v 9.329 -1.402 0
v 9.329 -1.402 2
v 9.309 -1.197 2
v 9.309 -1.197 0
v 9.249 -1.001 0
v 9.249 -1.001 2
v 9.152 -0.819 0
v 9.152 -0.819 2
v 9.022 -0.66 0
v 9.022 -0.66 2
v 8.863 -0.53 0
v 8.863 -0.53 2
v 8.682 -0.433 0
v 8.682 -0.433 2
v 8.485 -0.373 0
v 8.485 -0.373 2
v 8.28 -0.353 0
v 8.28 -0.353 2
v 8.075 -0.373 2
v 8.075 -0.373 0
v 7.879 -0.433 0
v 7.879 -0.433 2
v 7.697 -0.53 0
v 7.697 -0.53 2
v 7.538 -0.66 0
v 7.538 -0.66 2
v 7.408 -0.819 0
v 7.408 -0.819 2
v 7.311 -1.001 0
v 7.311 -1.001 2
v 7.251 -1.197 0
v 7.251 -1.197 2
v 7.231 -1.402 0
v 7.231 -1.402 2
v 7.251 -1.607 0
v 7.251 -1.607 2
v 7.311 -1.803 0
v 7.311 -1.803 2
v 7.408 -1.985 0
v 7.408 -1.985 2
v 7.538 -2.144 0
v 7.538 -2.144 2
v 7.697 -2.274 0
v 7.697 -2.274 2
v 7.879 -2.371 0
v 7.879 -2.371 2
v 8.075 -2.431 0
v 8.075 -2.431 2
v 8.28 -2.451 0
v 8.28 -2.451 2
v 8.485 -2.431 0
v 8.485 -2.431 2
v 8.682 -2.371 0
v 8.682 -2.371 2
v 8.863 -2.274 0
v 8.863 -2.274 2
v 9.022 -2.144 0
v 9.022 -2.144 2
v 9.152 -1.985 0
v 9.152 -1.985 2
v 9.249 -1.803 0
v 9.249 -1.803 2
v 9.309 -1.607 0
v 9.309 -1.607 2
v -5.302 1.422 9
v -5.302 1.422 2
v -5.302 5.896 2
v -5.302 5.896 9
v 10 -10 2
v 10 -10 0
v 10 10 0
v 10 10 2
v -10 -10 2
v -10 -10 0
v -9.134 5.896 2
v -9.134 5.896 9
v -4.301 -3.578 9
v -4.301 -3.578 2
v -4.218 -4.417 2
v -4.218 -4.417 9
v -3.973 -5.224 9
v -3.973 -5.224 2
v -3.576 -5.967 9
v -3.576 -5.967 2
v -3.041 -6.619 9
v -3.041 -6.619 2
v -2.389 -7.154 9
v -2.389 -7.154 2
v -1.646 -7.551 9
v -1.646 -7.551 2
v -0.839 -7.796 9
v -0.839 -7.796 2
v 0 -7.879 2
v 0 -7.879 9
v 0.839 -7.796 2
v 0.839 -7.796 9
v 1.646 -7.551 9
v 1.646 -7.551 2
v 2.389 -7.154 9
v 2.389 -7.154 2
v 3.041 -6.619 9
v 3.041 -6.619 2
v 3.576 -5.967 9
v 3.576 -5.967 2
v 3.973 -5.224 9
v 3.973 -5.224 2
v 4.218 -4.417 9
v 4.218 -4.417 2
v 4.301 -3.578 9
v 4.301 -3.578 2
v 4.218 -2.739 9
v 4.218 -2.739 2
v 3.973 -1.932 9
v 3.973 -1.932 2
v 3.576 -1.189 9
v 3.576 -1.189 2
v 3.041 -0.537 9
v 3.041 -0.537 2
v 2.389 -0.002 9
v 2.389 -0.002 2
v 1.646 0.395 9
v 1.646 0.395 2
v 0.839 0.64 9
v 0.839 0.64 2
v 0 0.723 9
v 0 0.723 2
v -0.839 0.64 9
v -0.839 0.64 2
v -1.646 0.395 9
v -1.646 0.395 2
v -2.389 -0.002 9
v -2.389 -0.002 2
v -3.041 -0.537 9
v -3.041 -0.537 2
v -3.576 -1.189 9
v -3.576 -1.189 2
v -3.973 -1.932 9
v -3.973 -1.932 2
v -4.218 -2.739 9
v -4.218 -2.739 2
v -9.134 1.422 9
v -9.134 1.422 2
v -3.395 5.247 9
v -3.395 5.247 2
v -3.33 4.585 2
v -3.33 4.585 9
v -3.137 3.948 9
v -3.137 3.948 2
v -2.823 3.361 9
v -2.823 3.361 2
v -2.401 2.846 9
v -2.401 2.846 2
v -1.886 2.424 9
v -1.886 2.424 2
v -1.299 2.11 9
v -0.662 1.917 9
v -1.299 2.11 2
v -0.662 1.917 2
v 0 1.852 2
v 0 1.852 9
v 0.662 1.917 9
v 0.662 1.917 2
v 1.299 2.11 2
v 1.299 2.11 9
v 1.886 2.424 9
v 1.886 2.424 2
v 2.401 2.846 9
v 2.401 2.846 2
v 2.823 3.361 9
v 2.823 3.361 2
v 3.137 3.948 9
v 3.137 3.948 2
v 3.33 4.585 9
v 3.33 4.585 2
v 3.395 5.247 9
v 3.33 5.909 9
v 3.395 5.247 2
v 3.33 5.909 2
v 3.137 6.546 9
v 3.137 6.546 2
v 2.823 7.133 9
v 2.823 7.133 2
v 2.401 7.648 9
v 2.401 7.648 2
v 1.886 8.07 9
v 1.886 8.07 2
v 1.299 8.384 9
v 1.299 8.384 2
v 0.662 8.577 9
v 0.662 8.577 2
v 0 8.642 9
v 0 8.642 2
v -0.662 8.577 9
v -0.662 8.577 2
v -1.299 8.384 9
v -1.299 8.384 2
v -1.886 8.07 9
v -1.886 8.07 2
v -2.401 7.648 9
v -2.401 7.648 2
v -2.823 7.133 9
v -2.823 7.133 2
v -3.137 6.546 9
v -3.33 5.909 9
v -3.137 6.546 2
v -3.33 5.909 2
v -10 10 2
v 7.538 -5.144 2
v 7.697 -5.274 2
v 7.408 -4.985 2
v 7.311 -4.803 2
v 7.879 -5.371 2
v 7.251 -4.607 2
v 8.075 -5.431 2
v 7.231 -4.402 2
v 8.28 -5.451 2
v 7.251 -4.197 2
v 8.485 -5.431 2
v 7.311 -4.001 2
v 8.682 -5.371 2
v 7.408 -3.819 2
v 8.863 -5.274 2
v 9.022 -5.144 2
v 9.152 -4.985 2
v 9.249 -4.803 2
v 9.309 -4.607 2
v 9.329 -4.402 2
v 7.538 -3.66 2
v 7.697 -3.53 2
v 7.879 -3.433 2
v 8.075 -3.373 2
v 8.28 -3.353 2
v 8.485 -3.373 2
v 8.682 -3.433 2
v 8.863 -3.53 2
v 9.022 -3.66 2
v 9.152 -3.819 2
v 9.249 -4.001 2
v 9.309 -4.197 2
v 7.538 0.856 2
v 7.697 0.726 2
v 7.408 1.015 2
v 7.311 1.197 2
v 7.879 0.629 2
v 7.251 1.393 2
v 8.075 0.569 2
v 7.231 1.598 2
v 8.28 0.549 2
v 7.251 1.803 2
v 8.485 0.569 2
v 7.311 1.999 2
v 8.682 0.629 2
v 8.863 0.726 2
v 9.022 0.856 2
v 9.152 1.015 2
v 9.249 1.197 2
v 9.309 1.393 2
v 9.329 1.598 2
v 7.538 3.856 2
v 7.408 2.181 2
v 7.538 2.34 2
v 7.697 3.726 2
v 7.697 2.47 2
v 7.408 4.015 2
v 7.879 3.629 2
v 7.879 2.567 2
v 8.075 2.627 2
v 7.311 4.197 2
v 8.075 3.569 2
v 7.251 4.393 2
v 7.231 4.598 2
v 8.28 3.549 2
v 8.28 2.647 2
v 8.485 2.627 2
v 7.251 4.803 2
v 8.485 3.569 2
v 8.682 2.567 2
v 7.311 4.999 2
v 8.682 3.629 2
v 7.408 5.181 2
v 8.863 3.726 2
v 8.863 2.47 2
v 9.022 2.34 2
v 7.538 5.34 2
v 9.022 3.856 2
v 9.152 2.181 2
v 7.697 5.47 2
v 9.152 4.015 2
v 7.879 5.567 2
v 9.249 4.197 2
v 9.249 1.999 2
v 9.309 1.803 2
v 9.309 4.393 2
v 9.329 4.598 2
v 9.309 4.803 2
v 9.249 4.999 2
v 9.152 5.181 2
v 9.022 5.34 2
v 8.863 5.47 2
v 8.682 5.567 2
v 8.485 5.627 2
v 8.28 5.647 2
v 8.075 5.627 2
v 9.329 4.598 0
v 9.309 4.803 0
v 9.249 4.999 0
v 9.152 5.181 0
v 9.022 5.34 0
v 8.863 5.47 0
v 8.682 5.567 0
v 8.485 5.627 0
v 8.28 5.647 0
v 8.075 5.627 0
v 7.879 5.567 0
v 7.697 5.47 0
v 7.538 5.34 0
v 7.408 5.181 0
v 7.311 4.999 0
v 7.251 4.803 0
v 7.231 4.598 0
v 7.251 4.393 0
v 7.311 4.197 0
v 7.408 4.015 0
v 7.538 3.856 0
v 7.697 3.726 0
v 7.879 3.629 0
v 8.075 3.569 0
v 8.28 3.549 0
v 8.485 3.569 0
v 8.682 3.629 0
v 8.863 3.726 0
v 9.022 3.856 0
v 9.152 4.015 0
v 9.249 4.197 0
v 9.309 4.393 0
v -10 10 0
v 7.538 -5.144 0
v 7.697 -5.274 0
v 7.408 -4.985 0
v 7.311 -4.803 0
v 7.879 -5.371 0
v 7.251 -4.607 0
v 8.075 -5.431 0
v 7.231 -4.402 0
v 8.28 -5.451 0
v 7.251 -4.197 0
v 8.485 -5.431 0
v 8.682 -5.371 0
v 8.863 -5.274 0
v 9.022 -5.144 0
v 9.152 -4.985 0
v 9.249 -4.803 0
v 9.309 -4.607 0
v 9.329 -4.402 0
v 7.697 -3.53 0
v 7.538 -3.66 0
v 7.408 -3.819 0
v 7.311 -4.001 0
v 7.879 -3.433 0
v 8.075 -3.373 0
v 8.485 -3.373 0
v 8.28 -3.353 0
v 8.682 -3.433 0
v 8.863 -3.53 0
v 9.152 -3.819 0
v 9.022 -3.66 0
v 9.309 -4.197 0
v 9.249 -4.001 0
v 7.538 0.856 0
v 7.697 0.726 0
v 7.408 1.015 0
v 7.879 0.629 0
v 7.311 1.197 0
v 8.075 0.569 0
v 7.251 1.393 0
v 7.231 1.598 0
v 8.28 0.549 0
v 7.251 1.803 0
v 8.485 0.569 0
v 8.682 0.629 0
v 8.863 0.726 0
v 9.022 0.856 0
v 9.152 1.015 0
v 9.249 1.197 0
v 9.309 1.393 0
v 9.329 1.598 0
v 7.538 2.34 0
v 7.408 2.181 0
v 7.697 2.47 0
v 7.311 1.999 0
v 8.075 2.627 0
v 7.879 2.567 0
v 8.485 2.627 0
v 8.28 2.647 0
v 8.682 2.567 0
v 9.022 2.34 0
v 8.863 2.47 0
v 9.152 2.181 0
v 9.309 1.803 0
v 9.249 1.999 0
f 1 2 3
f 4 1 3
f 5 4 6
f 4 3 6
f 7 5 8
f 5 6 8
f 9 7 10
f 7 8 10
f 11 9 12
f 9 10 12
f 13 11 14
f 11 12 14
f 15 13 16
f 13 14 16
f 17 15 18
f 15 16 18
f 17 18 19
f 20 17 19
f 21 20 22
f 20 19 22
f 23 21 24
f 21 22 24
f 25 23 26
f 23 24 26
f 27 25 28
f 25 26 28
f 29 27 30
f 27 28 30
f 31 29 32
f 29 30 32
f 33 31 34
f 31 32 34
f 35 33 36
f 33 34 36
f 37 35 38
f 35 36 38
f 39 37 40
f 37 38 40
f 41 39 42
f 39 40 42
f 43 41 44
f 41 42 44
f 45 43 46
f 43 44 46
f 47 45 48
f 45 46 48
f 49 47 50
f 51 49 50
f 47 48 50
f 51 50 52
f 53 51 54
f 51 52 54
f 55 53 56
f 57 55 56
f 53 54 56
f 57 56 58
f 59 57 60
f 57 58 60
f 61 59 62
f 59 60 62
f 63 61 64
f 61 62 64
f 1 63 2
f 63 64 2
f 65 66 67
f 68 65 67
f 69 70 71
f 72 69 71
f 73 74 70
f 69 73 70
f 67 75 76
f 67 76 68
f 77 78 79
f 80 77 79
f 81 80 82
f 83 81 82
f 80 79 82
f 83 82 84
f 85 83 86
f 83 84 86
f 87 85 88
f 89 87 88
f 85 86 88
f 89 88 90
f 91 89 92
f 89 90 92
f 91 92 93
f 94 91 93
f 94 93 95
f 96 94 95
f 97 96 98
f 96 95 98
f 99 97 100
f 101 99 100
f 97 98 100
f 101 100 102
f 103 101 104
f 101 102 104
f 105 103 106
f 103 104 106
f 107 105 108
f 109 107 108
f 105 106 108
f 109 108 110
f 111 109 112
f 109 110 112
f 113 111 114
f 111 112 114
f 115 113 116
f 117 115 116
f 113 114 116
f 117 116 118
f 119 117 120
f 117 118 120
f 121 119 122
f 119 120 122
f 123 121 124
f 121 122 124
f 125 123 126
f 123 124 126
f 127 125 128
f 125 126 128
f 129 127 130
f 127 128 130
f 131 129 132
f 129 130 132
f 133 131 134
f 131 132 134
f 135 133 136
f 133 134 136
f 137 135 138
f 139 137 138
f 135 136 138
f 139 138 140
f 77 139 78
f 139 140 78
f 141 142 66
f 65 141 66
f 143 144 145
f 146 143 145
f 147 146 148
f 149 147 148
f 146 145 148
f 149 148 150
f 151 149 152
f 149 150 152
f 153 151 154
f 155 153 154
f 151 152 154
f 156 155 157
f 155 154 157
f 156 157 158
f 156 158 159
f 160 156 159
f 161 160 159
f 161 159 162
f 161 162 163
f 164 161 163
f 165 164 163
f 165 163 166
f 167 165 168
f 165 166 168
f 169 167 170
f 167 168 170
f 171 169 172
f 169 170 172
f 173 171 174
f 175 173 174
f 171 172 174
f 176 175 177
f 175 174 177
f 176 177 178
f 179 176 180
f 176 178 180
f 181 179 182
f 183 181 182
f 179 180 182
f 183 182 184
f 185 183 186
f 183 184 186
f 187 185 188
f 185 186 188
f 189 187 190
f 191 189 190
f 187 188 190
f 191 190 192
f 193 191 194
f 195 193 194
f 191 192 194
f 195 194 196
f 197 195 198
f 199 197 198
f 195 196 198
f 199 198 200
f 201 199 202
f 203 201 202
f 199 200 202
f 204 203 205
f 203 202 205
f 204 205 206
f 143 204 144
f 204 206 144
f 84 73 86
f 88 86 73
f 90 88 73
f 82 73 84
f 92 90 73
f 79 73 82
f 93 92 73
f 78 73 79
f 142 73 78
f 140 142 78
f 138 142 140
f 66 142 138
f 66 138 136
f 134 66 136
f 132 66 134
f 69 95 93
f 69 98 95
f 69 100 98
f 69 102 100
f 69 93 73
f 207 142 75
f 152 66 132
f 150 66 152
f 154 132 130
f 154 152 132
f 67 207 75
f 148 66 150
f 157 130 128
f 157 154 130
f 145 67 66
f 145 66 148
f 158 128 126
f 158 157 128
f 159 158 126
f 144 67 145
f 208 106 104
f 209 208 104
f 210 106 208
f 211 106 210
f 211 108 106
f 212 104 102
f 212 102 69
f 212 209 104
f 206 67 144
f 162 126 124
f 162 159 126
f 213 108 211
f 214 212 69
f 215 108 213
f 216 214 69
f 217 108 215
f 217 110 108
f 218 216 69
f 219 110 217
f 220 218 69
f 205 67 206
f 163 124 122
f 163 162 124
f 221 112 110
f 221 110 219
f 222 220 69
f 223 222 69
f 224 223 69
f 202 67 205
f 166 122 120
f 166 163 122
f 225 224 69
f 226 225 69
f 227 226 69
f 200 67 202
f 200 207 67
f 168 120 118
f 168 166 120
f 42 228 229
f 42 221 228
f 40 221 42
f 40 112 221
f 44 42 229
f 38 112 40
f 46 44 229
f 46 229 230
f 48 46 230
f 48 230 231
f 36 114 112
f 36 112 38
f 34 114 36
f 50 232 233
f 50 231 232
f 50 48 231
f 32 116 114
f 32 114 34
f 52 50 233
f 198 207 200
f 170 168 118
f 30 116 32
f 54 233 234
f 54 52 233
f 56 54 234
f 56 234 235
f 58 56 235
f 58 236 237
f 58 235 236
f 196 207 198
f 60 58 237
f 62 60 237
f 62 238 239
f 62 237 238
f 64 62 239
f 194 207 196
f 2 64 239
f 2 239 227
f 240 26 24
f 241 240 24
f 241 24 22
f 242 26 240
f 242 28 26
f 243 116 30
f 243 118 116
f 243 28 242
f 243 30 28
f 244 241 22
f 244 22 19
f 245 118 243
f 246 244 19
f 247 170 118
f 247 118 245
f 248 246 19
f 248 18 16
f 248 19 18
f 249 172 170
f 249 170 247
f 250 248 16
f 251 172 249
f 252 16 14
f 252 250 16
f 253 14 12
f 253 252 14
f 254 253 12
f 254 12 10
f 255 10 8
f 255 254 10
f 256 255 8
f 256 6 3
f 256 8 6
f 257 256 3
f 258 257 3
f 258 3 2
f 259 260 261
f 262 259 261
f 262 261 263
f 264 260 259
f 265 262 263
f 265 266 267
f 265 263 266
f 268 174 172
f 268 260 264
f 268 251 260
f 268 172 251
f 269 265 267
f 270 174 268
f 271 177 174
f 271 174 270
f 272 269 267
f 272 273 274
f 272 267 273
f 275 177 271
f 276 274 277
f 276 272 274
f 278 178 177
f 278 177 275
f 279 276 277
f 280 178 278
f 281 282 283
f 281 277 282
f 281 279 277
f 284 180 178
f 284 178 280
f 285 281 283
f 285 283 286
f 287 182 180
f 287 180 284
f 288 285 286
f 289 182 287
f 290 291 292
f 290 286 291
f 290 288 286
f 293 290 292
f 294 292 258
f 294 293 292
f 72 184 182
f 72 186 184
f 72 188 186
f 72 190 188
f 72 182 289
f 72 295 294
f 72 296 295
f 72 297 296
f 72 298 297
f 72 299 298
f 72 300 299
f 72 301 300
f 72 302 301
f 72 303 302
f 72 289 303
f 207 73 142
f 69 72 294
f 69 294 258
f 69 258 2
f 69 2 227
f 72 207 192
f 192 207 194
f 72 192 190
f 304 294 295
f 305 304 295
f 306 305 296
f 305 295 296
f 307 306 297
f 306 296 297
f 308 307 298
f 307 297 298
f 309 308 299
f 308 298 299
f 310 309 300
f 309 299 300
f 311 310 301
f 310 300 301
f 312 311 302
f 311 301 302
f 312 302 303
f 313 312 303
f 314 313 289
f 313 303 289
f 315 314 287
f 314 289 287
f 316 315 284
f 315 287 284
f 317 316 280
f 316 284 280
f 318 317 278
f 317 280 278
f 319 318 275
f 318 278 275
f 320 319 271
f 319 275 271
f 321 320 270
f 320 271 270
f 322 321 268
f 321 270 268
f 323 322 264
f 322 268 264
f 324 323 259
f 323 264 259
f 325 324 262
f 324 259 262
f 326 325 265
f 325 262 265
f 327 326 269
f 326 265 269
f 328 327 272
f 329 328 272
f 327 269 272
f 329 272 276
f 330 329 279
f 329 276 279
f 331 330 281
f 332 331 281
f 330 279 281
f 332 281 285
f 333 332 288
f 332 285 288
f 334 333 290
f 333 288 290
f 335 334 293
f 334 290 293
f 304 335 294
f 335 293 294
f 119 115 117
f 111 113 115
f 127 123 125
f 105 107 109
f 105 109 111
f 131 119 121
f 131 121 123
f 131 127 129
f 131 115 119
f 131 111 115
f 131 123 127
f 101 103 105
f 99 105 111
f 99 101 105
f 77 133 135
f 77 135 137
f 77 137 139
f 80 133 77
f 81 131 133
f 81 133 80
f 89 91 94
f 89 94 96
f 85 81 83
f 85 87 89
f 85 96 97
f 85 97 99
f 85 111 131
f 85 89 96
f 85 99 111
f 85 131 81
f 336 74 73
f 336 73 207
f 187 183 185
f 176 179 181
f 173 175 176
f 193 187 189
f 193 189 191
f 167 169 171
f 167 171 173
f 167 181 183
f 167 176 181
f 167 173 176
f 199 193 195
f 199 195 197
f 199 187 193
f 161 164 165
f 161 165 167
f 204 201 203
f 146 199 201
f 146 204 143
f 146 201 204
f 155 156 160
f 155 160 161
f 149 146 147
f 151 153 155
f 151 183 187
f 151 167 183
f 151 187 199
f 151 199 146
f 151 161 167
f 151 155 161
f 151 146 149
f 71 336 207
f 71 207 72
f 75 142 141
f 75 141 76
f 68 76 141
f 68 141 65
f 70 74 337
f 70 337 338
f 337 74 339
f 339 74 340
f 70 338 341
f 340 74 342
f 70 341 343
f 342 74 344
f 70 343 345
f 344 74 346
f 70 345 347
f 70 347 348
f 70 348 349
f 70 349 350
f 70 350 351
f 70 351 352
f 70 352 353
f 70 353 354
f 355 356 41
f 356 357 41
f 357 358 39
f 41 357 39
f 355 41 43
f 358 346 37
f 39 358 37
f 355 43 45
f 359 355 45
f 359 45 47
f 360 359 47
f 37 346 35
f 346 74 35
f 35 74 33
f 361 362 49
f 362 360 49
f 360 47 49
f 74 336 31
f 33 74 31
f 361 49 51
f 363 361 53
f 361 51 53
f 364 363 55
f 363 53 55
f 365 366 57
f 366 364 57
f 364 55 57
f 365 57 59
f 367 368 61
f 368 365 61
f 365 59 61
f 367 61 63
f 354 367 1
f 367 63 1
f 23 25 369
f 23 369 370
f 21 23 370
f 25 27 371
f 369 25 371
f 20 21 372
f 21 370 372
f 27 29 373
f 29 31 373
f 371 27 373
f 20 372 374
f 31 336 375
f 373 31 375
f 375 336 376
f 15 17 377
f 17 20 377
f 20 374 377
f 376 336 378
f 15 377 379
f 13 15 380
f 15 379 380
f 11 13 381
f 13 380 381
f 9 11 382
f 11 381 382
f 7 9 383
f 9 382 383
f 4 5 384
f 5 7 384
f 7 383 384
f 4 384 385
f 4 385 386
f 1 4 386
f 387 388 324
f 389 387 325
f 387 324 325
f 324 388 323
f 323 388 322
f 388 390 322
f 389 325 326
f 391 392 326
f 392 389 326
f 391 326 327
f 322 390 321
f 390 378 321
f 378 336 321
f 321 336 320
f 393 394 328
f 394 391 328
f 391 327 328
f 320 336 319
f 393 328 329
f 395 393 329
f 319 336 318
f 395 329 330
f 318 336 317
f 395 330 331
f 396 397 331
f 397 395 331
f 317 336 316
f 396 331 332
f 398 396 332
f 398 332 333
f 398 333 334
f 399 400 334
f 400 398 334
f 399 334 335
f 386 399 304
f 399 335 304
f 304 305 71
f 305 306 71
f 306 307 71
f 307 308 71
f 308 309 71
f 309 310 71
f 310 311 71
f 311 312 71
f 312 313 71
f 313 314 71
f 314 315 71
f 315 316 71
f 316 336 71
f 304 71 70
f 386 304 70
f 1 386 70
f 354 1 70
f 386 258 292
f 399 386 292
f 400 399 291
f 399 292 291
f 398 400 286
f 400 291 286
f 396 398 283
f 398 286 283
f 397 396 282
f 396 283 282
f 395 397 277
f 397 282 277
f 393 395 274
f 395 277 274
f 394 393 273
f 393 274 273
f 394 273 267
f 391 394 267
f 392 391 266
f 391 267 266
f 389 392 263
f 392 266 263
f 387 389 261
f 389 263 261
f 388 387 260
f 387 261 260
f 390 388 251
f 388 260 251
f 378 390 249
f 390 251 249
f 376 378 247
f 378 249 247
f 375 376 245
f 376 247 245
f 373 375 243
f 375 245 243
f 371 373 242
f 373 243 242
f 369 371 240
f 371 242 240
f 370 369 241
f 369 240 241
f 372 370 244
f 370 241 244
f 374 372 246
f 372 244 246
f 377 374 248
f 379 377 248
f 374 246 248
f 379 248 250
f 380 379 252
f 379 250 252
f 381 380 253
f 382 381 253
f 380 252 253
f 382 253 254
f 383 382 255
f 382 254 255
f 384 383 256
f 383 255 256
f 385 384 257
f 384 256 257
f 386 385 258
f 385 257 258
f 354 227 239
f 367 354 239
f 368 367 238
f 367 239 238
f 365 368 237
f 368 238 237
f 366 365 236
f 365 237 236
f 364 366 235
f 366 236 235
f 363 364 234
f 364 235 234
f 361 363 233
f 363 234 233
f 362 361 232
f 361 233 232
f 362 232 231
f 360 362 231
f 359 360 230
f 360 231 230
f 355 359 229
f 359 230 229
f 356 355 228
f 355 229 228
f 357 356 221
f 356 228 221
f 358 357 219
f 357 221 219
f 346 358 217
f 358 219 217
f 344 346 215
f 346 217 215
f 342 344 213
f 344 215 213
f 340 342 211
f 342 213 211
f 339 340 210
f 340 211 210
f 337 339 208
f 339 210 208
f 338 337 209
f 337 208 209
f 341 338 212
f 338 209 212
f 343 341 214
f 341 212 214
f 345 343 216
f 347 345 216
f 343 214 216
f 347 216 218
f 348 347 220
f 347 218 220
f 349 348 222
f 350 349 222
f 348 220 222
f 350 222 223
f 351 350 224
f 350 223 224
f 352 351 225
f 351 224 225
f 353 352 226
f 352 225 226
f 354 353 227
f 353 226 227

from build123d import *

# Parameters (mm, degrees)
CROQUIS1_W              = 20
CROQUIS1_H              = 20
SALIENTE_EXTRUIR1_DEPTH = 2
CROQUIS2_R              = 3.395302969
CROQUIS2_R_2            = 4.300626918
CROQUIS2_W              = 3.832057349
CROQUIS2_H              = 4.474113334
SALIENTE_EXTRUIR2_DEPTH = 7
CROQUIS3_R              = 1.048920166
CORTAR_EXTRUIR1_DEPTH   = 2


with BuildPart() as part:
    # Croquis1 → Saliente-Extruir1 (new body)
    with BuildSketch(Plane.XY):
        Rectangle(CROQUIS1_W, CROQUIS1_H)
    extrude(amount=SALIENTE_EXTRUIR1_DEPTH)

    # Croquis2 → Saliente-Extruir2 (add)
    with BuildSketch(Plane.XY.offset(2)):
        with Locations(Location((0, 5.24700562, 0), (0, 0, 180))):
            Circle(CROQUIS2_R)
        with Locations(Location((0, -3.577988987, 0), (0, 0, 180))):
            Circle(CROQUIS2_R_2)
        with Locations((-7.217868445, 3.658804494)):
            Rectangle(CROQUIS2_W, CROQUIS2_H)
    extrude(amount=SALIENTE_EXTRUIR2_DEPTH)

    # Croquis3 → Cortar-Extruir1 (cut)
    with BuildSketch(Plane.XY.offset(2)):
        with Locations((8.280127459, 4.598002093)):
            Circle(CROQUIS3_R)
        with Locations((8.280127459, 1.598002093)):
            Circle(CROQUIS3_R)
        with Locations((8.280127459, -1.401997907)):
            Circle(CROQUIS3_R)
        with Locations((8.280127459, -4.401997907)):
            Circle(CROQUIS3_R)
    extrude(amount=-CORTAR_EXTRUIR1_DEPTH, mode=Mode.SUBTRACT)


solid = part.part
